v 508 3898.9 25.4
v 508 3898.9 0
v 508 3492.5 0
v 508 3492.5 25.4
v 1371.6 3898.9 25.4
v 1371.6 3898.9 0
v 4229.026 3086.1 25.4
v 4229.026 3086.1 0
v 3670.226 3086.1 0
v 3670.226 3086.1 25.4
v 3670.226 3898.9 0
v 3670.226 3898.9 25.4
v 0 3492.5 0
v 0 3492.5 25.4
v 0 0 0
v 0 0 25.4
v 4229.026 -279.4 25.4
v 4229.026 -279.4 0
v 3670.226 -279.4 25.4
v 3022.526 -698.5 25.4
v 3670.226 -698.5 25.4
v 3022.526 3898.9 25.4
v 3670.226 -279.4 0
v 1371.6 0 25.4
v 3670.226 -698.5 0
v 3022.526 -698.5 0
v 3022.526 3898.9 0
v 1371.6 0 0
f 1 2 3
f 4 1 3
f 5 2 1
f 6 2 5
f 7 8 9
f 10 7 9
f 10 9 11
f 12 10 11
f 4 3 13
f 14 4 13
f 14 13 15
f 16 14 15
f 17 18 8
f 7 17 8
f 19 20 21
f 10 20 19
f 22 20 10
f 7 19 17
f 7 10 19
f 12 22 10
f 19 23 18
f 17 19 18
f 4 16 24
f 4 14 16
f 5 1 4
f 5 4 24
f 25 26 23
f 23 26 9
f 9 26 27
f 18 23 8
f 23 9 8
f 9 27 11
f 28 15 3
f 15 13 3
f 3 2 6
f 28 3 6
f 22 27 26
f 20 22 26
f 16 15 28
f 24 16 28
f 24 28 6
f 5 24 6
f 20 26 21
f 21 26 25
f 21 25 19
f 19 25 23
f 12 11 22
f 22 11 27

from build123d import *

# Parameters (mm, degrees)
F0_W     = 1371.6
F0_H     = 1219.2
F0_W_2   = 863.6
F0_H_2   = 241.3
F1_DEPTH = 25.4
F3_DEPTH = 25.4


with BuildPart() as f1:
    # F0 (on Top) → F1 (new body)
    with BuildSketch(Plane.XY):
        with Locations((685.8, 609.6)):
            Rectangle(F0_W, F0_H)
        with Locations((685.8, 1828.8)):
            Rectangle(F0_W, F0_H)
        Polygon((0, 3492.5), (0, 2438.4), (1371.6, 2438.4), (1371.6, 3657.6), (508, 3657.6), (508, 3492.5), align=None)
        with Locations((939.8, 3778.25)):
            Rectangle(F0_W_2, F0_H_2)
    extrude(amount=F1_DEPTH)


with BuildPart() as f3:
    # F2 (on Top) → F3 (new body)
    with BuildSketch(Plane.XY):
        Polygon((3670.226026, 3898.9), (3022.526026, 3898.9), (3022.526026, -698.5), (3670.226026, -698.5), (3670.226026, -279.4), (4229.026026, -279.4), (4229.026026, 3086.1), (3670.226026, 3086.1), align=None)
    extrude(amount=F3_DEPTH)


solid = Compound([f1.part, f3.part])
